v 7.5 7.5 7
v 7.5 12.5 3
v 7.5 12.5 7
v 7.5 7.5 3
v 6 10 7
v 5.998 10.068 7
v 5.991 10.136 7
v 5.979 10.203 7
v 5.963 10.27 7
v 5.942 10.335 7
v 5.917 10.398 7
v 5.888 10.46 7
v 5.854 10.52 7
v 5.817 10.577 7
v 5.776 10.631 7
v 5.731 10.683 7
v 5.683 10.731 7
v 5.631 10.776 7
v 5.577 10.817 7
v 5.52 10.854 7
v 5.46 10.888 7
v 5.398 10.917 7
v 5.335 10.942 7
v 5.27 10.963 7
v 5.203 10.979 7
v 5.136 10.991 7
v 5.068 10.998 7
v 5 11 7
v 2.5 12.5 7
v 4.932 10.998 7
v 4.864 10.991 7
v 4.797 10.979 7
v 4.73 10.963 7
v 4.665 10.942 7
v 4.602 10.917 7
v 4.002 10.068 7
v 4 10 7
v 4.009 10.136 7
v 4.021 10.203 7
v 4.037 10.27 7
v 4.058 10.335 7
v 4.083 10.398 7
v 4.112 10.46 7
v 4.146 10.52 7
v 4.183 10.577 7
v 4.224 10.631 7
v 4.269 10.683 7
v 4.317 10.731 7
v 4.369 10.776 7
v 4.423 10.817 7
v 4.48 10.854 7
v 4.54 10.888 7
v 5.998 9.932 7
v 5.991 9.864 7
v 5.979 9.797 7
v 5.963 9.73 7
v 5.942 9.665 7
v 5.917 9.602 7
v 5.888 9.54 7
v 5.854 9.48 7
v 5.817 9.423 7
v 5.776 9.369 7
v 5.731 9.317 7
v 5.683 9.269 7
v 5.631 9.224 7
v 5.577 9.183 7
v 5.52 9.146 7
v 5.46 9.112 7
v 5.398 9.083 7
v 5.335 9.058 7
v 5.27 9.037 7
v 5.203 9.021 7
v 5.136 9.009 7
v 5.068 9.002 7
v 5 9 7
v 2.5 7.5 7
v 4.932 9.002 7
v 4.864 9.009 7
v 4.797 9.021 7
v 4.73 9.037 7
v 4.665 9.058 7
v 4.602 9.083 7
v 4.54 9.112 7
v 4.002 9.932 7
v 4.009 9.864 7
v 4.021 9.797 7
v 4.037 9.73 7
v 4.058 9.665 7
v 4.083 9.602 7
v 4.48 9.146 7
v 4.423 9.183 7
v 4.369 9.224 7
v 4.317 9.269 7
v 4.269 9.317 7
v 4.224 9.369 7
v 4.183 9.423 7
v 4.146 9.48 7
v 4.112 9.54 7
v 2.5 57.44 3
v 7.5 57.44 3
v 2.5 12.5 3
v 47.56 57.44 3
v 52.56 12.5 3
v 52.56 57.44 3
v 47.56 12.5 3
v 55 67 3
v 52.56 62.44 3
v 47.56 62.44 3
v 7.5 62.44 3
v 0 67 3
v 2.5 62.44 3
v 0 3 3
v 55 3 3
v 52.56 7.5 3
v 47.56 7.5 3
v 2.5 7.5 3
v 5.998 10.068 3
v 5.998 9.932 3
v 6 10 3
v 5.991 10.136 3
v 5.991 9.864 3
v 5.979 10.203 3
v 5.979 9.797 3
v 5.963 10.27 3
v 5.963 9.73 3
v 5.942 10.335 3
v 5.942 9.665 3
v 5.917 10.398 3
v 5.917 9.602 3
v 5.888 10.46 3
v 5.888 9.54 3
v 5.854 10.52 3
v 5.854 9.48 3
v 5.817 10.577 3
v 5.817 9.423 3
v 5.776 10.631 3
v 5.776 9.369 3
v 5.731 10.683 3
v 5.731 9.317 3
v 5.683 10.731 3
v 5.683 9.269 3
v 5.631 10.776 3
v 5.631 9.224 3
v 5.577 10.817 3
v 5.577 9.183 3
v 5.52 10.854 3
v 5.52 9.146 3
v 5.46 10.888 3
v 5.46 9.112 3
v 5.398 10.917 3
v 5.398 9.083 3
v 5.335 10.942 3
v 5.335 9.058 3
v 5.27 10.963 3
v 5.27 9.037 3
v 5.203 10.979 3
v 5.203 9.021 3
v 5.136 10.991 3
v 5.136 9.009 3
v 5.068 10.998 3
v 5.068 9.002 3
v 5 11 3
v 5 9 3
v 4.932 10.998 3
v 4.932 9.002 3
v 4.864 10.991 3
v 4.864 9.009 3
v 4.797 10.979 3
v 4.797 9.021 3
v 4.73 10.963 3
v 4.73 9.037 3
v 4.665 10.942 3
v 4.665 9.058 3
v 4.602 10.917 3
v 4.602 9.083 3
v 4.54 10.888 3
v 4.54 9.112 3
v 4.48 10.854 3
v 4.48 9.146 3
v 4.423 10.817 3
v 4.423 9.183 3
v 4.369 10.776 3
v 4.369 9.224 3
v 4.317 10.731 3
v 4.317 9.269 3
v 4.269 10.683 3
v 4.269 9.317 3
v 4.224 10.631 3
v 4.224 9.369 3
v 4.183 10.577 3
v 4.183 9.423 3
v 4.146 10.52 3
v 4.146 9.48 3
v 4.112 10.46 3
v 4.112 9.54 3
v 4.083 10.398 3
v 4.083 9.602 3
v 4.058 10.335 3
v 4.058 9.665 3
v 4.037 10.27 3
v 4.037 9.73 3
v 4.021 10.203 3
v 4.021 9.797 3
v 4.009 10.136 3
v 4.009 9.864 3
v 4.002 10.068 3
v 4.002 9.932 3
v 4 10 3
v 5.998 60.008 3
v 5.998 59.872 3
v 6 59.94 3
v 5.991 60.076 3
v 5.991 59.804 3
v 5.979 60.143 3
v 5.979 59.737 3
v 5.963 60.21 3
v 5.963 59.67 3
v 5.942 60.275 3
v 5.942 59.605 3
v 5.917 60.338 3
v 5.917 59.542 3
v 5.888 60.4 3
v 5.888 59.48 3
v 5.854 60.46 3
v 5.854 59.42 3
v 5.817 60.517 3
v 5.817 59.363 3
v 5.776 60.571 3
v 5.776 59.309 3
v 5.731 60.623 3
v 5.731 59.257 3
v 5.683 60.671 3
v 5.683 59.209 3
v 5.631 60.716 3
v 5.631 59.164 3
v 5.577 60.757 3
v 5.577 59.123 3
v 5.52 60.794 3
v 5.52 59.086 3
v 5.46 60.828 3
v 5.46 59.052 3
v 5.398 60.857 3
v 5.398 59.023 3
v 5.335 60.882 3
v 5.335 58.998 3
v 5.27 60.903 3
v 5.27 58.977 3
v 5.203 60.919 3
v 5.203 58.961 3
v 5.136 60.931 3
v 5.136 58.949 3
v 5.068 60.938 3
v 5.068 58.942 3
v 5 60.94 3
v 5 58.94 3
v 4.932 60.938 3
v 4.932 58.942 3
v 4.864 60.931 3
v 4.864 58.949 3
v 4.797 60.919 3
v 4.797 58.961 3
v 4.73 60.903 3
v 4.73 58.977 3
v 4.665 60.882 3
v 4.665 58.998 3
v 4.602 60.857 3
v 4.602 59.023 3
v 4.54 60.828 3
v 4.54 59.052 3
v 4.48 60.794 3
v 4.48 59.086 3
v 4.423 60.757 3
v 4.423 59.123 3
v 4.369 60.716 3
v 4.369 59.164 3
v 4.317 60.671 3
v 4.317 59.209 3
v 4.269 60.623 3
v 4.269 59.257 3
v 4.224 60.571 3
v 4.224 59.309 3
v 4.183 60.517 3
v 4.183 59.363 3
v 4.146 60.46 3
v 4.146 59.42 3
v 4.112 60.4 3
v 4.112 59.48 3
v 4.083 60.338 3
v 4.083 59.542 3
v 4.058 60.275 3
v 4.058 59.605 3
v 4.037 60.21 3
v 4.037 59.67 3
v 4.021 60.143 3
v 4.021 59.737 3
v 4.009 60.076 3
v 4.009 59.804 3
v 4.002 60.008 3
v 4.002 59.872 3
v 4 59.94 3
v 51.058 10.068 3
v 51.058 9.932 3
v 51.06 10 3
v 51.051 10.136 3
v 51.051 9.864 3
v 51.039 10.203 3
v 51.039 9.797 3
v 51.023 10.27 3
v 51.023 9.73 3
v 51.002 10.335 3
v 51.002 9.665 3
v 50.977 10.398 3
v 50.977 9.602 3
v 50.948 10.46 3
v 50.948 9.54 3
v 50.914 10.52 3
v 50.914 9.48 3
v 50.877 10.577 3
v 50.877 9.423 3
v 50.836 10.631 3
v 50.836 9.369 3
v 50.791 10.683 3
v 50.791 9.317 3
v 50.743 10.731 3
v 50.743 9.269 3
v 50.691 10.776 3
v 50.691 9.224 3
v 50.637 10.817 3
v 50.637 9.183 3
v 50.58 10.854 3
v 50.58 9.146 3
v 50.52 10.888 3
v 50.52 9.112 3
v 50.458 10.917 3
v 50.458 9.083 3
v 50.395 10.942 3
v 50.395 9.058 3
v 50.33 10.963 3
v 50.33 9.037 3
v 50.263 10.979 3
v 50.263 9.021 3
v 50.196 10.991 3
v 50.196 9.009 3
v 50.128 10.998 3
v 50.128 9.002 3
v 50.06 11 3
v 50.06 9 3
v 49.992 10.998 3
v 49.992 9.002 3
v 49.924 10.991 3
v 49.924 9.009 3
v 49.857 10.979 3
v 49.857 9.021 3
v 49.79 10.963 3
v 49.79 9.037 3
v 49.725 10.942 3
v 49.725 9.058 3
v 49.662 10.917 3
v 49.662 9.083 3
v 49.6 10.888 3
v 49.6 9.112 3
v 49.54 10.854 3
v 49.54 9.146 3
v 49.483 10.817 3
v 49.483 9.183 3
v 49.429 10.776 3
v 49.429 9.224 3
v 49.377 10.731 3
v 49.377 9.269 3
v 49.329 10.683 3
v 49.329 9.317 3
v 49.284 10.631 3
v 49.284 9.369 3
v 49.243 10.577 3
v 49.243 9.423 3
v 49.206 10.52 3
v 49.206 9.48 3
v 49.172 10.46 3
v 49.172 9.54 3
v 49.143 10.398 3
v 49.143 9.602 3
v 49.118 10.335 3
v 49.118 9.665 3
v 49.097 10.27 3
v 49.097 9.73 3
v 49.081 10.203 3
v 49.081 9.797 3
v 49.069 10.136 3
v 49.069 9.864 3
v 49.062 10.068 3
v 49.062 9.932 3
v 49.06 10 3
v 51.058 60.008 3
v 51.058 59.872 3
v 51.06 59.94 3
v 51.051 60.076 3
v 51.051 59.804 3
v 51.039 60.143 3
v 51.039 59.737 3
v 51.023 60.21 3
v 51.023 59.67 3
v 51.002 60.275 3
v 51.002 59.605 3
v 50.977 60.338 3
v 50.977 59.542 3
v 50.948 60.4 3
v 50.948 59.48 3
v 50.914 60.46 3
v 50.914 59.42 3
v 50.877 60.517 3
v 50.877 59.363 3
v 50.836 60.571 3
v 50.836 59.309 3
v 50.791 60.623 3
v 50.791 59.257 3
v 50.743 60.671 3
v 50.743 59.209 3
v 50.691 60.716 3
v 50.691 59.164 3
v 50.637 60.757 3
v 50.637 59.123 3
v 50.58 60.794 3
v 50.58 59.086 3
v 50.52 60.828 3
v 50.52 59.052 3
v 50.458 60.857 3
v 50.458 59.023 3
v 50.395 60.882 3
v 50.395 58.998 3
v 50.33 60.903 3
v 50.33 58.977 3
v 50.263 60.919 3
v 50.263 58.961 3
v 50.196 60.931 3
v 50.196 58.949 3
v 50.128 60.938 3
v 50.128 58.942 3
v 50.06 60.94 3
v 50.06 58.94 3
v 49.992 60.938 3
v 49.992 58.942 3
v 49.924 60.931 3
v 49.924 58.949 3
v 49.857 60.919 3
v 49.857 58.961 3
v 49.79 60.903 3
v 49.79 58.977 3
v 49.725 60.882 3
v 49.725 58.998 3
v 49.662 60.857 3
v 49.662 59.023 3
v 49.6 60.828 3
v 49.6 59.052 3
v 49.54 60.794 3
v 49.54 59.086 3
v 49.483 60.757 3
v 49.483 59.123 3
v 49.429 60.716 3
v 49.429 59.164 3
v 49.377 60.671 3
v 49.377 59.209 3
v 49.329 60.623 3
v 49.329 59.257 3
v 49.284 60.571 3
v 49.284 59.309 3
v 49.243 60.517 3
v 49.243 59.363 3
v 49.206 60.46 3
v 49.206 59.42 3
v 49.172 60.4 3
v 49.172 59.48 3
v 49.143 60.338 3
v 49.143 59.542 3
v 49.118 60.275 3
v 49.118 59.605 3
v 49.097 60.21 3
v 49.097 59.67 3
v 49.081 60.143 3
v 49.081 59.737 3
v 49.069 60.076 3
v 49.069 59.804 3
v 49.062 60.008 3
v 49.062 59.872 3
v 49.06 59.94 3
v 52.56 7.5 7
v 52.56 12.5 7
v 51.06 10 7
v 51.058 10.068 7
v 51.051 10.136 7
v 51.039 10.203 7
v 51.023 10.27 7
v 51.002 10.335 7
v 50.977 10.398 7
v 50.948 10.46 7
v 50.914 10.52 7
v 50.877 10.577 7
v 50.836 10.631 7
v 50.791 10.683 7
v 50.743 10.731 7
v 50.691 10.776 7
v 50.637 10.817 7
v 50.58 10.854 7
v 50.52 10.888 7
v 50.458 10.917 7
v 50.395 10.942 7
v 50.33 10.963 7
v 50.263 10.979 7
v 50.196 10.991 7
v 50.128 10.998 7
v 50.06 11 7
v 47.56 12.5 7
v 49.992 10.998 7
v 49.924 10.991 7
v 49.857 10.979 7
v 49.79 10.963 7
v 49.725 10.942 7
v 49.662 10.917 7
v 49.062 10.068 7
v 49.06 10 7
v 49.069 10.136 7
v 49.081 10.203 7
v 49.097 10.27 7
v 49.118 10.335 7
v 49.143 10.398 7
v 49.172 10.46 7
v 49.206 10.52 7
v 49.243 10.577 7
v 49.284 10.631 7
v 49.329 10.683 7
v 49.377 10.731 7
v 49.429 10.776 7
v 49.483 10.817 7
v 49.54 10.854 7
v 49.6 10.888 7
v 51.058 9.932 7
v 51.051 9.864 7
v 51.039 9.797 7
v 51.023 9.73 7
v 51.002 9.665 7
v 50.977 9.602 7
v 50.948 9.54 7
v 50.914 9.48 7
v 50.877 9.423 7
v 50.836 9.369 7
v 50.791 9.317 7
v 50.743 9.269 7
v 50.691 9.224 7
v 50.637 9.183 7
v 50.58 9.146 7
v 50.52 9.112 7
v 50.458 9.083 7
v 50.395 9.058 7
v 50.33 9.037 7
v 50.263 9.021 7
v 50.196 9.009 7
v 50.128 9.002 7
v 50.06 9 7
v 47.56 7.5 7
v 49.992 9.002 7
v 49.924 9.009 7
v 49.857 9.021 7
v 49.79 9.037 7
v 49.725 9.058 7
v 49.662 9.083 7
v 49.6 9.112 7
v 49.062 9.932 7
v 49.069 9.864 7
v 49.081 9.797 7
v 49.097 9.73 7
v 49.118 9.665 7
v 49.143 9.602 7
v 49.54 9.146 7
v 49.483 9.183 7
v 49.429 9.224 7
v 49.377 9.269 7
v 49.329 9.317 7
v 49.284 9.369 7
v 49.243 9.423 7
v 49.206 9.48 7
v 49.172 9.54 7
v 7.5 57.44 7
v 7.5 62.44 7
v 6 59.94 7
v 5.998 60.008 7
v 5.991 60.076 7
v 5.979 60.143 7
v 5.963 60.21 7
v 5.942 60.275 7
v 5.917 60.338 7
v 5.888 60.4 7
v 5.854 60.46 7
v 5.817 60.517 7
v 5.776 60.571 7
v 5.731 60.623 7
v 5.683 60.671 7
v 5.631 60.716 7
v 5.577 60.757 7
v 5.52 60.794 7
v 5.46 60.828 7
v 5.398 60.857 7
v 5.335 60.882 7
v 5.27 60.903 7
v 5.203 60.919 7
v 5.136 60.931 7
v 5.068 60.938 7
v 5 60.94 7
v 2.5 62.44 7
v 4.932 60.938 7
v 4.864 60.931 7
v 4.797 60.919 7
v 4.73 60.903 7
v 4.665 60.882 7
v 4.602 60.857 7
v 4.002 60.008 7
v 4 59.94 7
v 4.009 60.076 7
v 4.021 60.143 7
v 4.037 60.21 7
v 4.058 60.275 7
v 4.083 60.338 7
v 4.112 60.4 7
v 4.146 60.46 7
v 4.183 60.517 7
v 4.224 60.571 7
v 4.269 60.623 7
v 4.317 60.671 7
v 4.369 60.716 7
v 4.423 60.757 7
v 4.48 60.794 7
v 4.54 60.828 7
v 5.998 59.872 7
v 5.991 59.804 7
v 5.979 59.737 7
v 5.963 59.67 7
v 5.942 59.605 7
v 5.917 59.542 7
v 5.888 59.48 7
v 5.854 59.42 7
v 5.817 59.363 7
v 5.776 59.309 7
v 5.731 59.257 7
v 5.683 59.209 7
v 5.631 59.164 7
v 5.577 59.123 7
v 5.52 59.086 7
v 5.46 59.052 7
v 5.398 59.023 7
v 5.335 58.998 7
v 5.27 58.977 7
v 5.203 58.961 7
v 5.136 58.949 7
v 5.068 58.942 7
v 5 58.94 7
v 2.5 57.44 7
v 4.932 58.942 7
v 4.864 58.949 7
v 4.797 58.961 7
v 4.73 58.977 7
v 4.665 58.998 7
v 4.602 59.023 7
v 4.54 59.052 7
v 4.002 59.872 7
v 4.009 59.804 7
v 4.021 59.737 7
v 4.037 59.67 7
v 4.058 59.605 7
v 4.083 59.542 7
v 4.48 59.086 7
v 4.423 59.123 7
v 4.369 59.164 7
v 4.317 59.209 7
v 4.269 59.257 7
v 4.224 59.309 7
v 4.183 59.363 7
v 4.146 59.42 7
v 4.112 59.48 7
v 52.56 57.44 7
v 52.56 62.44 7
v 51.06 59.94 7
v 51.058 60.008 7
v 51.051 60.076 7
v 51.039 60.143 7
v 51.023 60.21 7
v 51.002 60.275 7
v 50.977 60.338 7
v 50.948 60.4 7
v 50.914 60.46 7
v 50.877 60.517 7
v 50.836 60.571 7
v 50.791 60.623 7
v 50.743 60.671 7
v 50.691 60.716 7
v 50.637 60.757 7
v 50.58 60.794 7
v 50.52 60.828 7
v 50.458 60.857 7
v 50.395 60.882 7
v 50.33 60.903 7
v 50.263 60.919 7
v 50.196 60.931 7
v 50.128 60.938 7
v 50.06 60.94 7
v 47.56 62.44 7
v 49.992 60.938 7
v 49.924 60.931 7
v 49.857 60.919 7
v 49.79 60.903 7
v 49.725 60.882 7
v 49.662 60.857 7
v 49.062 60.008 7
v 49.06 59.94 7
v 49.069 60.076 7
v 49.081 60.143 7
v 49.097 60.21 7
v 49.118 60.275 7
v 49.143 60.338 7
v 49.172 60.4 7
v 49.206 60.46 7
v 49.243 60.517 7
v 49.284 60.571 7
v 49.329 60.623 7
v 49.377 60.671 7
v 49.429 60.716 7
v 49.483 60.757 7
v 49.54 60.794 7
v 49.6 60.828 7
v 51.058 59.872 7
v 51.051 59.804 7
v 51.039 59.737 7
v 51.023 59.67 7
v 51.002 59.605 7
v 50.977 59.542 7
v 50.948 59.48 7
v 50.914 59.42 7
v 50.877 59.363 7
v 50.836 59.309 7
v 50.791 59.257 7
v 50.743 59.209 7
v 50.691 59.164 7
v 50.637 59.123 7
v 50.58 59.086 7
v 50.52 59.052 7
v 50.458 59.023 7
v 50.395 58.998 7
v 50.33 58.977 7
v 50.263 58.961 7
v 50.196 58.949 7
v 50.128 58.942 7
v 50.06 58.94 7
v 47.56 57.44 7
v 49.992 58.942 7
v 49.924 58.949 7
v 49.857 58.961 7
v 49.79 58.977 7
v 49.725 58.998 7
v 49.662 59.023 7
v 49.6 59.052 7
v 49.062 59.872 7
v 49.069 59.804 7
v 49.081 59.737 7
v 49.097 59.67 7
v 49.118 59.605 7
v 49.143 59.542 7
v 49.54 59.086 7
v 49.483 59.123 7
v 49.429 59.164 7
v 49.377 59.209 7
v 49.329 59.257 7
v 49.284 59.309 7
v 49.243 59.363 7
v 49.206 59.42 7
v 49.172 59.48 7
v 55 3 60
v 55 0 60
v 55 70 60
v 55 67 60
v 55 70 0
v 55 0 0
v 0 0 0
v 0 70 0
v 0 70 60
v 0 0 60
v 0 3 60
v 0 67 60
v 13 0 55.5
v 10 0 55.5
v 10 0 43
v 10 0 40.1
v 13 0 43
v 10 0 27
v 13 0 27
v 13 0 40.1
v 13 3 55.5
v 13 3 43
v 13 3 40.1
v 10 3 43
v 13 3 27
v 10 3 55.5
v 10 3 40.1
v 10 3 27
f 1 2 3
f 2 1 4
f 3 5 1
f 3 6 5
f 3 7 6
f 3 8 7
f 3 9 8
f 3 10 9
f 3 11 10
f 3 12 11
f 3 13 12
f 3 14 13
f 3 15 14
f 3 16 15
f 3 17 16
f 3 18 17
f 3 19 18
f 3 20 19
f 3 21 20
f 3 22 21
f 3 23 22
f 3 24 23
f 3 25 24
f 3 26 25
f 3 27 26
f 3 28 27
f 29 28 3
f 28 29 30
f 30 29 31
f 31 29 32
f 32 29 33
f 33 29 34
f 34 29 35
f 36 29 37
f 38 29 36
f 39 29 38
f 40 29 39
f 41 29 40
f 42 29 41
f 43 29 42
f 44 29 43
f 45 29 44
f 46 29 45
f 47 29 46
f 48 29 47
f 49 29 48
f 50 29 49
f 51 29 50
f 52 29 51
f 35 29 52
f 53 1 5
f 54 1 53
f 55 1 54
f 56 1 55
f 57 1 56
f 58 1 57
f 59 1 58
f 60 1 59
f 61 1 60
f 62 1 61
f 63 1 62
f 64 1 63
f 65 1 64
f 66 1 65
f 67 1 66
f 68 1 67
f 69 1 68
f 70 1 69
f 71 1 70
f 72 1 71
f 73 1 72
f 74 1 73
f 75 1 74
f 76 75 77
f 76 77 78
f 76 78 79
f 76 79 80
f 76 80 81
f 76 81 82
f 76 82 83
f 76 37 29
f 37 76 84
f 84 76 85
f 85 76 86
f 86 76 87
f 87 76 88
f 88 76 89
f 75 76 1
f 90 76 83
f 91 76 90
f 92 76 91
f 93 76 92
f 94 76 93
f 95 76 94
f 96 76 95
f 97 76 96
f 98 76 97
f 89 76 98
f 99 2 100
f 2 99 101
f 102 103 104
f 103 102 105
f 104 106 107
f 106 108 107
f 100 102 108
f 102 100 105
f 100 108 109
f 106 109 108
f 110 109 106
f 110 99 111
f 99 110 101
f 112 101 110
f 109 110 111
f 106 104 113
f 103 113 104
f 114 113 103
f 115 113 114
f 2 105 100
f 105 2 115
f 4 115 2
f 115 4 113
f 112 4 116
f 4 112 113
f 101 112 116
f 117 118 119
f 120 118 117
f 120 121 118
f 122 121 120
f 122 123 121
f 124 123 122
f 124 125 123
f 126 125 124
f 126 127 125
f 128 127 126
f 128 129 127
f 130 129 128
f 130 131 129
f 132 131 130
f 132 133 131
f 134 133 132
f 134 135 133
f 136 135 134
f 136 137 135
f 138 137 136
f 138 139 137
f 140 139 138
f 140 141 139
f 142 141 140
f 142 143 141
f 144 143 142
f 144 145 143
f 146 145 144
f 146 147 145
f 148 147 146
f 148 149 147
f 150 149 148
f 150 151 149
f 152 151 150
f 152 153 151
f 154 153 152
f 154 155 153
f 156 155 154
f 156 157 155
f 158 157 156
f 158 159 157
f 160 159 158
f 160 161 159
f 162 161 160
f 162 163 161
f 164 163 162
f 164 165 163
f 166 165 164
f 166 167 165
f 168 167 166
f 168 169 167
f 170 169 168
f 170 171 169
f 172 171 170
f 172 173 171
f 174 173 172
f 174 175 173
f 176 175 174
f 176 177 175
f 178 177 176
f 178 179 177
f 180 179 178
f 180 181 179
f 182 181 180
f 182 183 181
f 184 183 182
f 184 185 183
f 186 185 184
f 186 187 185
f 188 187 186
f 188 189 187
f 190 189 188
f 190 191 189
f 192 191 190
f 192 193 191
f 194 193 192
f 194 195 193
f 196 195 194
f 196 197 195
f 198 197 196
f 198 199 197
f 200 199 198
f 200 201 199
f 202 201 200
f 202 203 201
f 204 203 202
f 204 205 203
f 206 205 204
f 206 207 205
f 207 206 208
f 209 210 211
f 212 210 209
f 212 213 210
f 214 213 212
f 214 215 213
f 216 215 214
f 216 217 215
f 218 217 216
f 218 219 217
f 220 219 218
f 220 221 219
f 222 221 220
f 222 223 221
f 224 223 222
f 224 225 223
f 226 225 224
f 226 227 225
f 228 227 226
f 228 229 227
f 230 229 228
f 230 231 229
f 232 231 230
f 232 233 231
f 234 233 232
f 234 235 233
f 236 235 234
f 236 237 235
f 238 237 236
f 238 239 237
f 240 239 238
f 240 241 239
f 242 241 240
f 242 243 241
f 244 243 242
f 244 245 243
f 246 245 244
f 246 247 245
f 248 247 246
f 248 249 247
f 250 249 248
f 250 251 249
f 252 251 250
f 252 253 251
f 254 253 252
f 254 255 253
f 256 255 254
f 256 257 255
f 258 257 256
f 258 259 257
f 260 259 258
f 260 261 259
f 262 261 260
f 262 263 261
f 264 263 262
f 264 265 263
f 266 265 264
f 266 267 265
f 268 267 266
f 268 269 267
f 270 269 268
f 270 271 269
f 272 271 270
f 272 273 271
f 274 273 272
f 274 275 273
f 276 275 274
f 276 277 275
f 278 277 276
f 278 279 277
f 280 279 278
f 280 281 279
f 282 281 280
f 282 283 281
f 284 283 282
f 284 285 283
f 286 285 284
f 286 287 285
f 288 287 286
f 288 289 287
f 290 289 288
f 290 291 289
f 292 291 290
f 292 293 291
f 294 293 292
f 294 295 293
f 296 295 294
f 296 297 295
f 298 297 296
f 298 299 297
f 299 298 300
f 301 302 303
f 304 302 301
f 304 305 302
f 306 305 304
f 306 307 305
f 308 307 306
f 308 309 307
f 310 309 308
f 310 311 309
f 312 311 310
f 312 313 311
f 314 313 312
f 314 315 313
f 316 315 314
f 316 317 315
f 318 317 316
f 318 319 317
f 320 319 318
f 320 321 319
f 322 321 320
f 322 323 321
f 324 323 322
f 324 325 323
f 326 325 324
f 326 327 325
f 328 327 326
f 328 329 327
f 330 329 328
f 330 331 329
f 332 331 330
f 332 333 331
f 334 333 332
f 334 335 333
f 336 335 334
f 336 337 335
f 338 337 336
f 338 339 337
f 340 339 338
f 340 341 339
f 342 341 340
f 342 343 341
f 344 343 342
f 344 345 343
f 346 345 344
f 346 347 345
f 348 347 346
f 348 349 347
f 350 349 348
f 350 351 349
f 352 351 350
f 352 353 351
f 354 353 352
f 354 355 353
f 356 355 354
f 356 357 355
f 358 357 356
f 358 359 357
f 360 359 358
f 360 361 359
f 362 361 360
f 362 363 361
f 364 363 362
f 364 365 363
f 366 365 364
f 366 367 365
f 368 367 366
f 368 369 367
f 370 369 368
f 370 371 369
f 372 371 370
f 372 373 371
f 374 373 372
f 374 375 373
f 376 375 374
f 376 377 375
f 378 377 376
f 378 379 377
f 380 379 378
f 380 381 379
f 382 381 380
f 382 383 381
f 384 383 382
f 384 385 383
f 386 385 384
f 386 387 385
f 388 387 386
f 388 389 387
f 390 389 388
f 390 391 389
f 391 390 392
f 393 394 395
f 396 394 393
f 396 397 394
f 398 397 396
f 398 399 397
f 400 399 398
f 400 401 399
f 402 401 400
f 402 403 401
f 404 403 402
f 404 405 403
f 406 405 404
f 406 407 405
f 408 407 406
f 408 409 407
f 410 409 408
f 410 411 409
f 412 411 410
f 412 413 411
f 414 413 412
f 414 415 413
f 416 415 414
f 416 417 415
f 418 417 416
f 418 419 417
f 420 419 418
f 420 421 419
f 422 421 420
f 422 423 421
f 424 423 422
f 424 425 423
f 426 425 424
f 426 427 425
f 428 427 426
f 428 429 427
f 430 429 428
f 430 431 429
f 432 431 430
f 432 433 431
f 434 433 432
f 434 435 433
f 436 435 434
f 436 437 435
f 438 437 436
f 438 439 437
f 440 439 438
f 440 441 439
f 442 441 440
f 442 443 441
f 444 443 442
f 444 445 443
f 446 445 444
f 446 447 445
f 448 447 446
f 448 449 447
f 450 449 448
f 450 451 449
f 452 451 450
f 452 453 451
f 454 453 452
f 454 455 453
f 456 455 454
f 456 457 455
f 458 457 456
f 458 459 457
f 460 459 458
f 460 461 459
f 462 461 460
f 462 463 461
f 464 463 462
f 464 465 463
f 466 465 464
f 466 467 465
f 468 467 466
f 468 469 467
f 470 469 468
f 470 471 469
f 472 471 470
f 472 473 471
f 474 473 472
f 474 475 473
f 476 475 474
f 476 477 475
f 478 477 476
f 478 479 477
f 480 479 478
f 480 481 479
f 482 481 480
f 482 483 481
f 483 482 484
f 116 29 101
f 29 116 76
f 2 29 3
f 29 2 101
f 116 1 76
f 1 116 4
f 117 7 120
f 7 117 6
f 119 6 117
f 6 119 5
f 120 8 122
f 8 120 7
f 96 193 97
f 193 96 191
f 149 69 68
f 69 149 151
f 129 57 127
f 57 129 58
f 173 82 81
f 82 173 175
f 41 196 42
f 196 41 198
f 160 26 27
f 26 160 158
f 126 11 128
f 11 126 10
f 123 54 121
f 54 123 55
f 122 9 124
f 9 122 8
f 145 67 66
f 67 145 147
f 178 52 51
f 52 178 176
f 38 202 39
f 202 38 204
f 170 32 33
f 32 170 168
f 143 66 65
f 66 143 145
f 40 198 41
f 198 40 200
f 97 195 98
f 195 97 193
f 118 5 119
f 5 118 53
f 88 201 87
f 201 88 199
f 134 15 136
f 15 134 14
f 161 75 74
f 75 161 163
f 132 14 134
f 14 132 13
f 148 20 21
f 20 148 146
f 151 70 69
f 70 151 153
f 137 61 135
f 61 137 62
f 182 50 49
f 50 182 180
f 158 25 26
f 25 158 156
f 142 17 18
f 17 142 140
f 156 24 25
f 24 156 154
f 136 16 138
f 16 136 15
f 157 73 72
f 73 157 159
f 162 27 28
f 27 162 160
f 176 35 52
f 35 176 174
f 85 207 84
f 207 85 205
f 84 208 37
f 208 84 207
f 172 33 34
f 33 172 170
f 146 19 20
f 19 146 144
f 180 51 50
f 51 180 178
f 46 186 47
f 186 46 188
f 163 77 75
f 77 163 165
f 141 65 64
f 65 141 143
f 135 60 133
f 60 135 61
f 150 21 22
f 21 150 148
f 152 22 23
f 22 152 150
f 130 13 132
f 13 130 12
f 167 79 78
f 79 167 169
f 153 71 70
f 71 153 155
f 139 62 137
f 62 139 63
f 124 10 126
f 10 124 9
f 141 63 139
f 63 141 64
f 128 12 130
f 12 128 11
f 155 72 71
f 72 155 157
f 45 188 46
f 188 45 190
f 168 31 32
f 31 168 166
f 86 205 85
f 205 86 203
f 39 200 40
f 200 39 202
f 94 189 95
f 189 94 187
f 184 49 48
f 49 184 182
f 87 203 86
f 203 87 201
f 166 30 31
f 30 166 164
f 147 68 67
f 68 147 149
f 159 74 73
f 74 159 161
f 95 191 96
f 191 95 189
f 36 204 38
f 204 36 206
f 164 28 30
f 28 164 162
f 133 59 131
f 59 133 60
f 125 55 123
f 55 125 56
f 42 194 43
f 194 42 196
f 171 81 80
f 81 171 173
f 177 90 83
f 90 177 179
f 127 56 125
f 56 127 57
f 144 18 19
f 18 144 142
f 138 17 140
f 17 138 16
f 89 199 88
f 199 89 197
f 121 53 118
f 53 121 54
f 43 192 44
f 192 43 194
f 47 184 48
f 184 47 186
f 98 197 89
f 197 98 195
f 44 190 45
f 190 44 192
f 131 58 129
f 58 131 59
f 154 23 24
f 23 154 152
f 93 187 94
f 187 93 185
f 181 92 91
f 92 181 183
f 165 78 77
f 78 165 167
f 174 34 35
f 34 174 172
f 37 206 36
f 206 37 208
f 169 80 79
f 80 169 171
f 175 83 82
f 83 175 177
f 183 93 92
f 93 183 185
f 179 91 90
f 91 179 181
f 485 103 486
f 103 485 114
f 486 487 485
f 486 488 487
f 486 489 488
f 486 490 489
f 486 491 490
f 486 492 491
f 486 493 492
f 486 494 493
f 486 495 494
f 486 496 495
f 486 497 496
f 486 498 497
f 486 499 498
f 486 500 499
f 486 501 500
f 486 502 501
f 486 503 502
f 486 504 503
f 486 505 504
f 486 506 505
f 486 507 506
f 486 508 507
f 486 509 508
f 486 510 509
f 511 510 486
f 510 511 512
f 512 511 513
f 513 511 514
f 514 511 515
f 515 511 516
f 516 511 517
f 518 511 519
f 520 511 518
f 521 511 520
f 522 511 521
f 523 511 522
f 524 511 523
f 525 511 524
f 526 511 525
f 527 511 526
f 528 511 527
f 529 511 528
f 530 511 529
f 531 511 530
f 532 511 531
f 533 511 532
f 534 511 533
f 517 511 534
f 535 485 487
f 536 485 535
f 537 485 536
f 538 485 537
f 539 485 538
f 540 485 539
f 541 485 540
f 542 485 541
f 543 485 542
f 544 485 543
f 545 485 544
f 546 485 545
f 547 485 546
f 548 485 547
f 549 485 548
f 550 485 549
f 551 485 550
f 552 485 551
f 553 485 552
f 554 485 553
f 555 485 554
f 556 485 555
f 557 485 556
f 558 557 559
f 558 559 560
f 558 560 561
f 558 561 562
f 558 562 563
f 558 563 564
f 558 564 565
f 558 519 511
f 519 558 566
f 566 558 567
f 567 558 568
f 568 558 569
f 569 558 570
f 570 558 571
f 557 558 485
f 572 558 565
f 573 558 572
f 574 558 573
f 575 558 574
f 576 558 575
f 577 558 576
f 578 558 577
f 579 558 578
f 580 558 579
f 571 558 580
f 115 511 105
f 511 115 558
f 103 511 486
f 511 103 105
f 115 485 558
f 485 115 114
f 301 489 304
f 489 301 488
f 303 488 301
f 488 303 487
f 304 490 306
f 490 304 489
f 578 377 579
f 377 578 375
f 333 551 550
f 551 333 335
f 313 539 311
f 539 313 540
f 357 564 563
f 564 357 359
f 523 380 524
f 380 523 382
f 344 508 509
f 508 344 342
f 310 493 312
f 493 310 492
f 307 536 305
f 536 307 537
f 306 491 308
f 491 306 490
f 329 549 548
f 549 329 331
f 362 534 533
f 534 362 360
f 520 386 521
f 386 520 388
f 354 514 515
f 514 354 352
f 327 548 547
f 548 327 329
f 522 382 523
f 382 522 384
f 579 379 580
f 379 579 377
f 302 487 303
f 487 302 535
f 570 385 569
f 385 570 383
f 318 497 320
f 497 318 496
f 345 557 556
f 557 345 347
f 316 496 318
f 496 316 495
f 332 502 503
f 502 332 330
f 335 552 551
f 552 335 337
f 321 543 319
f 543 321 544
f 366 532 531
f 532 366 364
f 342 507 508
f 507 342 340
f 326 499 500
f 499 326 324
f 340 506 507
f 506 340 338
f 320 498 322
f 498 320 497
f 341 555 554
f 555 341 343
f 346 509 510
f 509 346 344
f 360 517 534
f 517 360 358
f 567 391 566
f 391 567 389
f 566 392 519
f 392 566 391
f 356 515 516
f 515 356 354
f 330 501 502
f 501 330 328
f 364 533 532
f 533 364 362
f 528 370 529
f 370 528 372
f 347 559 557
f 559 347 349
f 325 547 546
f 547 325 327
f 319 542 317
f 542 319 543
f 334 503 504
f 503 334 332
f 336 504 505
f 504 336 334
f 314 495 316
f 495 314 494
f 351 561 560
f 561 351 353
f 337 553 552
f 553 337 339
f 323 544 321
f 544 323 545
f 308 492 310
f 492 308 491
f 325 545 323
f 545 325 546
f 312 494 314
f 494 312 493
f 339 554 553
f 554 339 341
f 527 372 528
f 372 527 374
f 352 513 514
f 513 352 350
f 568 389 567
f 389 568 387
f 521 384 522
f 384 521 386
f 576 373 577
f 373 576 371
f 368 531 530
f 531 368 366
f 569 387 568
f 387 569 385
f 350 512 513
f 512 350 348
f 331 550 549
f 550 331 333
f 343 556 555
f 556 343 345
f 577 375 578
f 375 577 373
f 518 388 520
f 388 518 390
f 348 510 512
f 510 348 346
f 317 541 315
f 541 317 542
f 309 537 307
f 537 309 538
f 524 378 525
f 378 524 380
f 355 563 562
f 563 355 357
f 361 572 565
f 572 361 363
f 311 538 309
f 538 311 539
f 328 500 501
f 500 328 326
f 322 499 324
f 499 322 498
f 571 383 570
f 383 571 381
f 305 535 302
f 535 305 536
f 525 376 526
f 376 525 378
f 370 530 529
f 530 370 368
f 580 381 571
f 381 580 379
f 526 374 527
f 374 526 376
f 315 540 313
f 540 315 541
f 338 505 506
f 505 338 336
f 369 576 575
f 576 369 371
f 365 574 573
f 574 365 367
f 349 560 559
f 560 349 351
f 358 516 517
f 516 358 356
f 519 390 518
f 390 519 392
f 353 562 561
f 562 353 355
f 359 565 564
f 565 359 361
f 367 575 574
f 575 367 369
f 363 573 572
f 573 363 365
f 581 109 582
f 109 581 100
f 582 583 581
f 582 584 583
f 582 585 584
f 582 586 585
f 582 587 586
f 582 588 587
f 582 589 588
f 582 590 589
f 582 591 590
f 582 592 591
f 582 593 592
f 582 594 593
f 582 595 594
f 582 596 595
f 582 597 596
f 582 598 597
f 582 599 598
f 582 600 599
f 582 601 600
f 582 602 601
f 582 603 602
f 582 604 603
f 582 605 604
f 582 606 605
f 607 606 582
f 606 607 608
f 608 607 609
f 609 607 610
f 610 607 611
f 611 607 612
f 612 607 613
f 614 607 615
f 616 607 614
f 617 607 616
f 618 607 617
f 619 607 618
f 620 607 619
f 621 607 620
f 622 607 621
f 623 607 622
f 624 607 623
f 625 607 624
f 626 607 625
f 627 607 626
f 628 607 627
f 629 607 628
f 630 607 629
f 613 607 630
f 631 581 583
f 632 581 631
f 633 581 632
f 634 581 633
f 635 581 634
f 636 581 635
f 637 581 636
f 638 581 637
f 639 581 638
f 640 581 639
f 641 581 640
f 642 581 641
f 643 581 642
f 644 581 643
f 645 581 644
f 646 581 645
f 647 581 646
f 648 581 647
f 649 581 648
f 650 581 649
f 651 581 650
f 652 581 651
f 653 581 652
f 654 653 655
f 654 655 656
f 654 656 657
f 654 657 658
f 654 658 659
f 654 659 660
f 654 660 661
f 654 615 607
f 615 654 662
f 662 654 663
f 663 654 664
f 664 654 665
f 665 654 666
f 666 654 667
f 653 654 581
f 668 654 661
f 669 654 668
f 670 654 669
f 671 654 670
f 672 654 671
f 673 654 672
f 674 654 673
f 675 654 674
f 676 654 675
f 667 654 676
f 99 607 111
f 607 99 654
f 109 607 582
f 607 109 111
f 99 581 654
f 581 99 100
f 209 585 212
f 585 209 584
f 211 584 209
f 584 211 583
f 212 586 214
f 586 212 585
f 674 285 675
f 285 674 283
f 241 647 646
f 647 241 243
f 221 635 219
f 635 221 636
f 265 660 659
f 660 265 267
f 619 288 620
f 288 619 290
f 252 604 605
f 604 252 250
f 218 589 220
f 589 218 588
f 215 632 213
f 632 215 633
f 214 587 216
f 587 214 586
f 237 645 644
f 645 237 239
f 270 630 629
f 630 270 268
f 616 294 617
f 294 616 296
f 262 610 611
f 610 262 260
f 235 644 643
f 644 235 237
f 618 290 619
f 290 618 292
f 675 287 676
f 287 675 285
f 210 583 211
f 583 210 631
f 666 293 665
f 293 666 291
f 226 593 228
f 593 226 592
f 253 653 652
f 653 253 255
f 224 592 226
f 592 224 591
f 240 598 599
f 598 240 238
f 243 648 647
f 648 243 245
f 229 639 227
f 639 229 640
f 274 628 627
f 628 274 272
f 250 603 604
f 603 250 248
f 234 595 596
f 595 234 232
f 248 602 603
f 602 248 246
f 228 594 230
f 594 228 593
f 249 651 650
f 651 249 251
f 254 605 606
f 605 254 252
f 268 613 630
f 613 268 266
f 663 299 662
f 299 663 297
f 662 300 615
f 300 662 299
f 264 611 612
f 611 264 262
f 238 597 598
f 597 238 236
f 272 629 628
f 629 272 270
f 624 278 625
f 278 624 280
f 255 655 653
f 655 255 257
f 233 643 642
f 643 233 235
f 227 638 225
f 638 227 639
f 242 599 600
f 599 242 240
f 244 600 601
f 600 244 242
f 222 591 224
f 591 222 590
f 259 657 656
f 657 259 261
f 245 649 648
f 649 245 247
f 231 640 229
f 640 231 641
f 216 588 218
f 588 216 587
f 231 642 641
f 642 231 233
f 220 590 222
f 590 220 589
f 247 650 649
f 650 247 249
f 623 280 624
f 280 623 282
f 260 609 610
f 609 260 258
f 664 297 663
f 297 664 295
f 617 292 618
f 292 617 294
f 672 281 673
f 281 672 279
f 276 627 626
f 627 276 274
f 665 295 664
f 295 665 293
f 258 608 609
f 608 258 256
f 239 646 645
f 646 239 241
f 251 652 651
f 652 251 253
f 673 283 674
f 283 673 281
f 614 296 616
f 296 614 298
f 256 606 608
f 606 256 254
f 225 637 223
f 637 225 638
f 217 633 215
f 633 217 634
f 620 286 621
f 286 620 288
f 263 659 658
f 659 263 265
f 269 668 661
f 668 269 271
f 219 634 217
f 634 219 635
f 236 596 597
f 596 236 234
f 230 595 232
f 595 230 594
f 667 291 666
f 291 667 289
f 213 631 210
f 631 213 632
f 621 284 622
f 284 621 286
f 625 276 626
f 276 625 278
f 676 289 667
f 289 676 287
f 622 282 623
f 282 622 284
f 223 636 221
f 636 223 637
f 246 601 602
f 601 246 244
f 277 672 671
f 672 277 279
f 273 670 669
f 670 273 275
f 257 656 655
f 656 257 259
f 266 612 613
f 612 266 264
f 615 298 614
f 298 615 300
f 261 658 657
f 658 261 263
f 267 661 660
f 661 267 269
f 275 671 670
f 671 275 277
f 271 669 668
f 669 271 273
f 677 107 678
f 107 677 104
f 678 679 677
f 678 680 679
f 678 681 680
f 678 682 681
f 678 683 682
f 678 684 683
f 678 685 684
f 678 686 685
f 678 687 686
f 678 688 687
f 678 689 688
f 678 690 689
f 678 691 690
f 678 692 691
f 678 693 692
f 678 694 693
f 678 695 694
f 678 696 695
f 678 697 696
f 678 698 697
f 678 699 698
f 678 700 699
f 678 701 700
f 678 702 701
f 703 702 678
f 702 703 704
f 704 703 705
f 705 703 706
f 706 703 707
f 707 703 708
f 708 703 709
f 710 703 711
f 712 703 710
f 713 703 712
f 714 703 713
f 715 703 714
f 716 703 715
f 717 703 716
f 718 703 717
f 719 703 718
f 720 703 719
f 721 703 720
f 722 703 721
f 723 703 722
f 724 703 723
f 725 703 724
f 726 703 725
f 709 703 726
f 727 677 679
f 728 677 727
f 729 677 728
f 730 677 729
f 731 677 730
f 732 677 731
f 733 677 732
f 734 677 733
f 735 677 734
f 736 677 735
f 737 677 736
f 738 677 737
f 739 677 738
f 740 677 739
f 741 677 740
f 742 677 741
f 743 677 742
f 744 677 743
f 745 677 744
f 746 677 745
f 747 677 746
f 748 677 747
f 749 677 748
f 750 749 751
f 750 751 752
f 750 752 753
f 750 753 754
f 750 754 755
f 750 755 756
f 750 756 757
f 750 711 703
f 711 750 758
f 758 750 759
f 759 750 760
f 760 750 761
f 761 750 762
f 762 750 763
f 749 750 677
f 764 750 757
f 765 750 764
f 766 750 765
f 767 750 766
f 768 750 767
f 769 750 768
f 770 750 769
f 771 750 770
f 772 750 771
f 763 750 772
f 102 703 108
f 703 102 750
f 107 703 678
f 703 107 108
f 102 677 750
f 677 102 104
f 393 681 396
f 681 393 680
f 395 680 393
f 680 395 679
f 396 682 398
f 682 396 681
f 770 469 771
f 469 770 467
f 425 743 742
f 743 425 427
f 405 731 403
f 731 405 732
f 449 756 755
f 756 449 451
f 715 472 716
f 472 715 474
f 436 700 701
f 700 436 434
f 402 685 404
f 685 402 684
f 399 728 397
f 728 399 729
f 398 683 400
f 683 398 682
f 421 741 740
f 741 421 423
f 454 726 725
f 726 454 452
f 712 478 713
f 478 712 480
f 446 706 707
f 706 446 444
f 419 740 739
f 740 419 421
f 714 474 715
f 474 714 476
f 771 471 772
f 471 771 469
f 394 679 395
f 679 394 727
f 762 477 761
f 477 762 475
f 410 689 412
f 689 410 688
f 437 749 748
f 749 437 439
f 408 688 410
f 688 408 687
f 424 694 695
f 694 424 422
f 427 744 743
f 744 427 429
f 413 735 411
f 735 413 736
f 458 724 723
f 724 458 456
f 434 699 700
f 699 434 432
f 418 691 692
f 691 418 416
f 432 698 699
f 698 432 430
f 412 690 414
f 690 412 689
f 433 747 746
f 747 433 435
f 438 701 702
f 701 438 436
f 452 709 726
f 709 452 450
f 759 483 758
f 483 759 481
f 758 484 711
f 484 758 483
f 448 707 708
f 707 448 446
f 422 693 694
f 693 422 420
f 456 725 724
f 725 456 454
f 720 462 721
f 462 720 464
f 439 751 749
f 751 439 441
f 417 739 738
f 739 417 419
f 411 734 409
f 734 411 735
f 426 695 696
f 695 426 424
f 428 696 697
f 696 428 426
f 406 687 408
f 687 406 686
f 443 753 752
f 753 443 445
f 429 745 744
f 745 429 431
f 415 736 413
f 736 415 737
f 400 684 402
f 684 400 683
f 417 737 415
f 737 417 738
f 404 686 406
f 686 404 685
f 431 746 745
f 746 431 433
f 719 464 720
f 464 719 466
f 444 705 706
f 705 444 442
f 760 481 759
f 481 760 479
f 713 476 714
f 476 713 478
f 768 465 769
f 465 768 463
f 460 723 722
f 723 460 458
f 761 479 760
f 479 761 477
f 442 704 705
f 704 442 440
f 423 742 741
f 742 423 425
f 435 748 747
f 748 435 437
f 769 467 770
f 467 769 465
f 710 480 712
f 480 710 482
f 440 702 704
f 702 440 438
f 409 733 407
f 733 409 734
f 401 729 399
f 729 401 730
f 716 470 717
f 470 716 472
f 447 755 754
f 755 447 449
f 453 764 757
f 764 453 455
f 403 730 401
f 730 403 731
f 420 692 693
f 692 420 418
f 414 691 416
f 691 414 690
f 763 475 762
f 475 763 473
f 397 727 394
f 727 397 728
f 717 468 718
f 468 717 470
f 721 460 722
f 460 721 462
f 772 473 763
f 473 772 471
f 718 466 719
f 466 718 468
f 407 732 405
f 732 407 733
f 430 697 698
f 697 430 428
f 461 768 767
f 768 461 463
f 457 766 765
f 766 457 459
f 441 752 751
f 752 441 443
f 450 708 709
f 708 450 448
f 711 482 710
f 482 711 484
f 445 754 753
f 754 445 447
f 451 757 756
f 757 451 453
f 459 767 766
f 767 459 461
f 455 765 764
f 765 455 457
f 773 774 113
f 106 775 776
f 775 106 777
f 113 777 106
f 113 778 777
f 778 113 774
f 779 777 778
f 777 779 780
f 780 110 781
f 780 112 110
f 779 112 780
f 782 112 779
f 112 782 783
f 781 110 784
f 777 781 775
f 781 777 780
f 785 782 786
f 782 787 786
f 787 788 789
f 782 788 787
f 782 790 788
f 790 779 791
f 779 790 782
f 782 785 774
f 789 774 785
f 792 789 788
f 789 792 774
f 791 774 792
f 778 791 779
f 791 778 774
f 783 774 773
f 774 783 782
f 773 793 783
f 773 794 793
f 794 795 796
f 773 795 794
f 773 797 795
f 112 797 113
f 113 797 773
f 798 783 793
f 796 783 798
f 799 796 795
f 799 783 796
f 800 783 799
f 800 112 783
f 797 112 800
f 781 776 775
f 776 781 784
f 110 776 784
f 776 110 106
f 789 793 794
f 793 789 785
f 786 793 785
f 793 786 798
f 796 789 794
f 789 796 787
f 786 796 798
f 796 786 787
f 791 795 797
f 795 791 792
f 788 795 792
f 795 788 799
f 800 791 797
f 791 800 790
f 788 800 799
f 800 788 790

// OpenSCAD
$fn=92;
difference(){
	union(){
		cube([55,70,3]);
		cube([55,3,60]);
		translate([0,67,0]) cube([55,3,60]);
		PCB(45.06,49.94,5,10,1);
	}
	union(){
		translate([10,0,43]) cube([3.0,3,12.5]);	//OLED
		translate([10,0,27]) cube([3.0,3,13.1]);	//buttons
	}
}



module pata(r){
	difference(){
		translate([-2.5,-2.5,3]) cube([5,5,4]);
		translate([0,0,3]) cylinder(h=4, r=r); // agujero en (0,0)
	}
}

module PCB(dx,dy,x0,y0,r){
    // MEDIDAS DE LA PLACA
    //    dx       distancia entre agujeros eje x
    //    dy       distancia entre agujeros eje y
    //    x0       distancia x 1r agujero a esquina
    //    xy       distancia y 1r agujero a esquina
    translate([x0,y0,0]) pata(r);
    translate([x0+dx,y0,0]) pata(r);
    translate([x0,y0+dy,0]) pata(r);
    translate([x0+dx,y0+dy,0]) pata(r);
}
